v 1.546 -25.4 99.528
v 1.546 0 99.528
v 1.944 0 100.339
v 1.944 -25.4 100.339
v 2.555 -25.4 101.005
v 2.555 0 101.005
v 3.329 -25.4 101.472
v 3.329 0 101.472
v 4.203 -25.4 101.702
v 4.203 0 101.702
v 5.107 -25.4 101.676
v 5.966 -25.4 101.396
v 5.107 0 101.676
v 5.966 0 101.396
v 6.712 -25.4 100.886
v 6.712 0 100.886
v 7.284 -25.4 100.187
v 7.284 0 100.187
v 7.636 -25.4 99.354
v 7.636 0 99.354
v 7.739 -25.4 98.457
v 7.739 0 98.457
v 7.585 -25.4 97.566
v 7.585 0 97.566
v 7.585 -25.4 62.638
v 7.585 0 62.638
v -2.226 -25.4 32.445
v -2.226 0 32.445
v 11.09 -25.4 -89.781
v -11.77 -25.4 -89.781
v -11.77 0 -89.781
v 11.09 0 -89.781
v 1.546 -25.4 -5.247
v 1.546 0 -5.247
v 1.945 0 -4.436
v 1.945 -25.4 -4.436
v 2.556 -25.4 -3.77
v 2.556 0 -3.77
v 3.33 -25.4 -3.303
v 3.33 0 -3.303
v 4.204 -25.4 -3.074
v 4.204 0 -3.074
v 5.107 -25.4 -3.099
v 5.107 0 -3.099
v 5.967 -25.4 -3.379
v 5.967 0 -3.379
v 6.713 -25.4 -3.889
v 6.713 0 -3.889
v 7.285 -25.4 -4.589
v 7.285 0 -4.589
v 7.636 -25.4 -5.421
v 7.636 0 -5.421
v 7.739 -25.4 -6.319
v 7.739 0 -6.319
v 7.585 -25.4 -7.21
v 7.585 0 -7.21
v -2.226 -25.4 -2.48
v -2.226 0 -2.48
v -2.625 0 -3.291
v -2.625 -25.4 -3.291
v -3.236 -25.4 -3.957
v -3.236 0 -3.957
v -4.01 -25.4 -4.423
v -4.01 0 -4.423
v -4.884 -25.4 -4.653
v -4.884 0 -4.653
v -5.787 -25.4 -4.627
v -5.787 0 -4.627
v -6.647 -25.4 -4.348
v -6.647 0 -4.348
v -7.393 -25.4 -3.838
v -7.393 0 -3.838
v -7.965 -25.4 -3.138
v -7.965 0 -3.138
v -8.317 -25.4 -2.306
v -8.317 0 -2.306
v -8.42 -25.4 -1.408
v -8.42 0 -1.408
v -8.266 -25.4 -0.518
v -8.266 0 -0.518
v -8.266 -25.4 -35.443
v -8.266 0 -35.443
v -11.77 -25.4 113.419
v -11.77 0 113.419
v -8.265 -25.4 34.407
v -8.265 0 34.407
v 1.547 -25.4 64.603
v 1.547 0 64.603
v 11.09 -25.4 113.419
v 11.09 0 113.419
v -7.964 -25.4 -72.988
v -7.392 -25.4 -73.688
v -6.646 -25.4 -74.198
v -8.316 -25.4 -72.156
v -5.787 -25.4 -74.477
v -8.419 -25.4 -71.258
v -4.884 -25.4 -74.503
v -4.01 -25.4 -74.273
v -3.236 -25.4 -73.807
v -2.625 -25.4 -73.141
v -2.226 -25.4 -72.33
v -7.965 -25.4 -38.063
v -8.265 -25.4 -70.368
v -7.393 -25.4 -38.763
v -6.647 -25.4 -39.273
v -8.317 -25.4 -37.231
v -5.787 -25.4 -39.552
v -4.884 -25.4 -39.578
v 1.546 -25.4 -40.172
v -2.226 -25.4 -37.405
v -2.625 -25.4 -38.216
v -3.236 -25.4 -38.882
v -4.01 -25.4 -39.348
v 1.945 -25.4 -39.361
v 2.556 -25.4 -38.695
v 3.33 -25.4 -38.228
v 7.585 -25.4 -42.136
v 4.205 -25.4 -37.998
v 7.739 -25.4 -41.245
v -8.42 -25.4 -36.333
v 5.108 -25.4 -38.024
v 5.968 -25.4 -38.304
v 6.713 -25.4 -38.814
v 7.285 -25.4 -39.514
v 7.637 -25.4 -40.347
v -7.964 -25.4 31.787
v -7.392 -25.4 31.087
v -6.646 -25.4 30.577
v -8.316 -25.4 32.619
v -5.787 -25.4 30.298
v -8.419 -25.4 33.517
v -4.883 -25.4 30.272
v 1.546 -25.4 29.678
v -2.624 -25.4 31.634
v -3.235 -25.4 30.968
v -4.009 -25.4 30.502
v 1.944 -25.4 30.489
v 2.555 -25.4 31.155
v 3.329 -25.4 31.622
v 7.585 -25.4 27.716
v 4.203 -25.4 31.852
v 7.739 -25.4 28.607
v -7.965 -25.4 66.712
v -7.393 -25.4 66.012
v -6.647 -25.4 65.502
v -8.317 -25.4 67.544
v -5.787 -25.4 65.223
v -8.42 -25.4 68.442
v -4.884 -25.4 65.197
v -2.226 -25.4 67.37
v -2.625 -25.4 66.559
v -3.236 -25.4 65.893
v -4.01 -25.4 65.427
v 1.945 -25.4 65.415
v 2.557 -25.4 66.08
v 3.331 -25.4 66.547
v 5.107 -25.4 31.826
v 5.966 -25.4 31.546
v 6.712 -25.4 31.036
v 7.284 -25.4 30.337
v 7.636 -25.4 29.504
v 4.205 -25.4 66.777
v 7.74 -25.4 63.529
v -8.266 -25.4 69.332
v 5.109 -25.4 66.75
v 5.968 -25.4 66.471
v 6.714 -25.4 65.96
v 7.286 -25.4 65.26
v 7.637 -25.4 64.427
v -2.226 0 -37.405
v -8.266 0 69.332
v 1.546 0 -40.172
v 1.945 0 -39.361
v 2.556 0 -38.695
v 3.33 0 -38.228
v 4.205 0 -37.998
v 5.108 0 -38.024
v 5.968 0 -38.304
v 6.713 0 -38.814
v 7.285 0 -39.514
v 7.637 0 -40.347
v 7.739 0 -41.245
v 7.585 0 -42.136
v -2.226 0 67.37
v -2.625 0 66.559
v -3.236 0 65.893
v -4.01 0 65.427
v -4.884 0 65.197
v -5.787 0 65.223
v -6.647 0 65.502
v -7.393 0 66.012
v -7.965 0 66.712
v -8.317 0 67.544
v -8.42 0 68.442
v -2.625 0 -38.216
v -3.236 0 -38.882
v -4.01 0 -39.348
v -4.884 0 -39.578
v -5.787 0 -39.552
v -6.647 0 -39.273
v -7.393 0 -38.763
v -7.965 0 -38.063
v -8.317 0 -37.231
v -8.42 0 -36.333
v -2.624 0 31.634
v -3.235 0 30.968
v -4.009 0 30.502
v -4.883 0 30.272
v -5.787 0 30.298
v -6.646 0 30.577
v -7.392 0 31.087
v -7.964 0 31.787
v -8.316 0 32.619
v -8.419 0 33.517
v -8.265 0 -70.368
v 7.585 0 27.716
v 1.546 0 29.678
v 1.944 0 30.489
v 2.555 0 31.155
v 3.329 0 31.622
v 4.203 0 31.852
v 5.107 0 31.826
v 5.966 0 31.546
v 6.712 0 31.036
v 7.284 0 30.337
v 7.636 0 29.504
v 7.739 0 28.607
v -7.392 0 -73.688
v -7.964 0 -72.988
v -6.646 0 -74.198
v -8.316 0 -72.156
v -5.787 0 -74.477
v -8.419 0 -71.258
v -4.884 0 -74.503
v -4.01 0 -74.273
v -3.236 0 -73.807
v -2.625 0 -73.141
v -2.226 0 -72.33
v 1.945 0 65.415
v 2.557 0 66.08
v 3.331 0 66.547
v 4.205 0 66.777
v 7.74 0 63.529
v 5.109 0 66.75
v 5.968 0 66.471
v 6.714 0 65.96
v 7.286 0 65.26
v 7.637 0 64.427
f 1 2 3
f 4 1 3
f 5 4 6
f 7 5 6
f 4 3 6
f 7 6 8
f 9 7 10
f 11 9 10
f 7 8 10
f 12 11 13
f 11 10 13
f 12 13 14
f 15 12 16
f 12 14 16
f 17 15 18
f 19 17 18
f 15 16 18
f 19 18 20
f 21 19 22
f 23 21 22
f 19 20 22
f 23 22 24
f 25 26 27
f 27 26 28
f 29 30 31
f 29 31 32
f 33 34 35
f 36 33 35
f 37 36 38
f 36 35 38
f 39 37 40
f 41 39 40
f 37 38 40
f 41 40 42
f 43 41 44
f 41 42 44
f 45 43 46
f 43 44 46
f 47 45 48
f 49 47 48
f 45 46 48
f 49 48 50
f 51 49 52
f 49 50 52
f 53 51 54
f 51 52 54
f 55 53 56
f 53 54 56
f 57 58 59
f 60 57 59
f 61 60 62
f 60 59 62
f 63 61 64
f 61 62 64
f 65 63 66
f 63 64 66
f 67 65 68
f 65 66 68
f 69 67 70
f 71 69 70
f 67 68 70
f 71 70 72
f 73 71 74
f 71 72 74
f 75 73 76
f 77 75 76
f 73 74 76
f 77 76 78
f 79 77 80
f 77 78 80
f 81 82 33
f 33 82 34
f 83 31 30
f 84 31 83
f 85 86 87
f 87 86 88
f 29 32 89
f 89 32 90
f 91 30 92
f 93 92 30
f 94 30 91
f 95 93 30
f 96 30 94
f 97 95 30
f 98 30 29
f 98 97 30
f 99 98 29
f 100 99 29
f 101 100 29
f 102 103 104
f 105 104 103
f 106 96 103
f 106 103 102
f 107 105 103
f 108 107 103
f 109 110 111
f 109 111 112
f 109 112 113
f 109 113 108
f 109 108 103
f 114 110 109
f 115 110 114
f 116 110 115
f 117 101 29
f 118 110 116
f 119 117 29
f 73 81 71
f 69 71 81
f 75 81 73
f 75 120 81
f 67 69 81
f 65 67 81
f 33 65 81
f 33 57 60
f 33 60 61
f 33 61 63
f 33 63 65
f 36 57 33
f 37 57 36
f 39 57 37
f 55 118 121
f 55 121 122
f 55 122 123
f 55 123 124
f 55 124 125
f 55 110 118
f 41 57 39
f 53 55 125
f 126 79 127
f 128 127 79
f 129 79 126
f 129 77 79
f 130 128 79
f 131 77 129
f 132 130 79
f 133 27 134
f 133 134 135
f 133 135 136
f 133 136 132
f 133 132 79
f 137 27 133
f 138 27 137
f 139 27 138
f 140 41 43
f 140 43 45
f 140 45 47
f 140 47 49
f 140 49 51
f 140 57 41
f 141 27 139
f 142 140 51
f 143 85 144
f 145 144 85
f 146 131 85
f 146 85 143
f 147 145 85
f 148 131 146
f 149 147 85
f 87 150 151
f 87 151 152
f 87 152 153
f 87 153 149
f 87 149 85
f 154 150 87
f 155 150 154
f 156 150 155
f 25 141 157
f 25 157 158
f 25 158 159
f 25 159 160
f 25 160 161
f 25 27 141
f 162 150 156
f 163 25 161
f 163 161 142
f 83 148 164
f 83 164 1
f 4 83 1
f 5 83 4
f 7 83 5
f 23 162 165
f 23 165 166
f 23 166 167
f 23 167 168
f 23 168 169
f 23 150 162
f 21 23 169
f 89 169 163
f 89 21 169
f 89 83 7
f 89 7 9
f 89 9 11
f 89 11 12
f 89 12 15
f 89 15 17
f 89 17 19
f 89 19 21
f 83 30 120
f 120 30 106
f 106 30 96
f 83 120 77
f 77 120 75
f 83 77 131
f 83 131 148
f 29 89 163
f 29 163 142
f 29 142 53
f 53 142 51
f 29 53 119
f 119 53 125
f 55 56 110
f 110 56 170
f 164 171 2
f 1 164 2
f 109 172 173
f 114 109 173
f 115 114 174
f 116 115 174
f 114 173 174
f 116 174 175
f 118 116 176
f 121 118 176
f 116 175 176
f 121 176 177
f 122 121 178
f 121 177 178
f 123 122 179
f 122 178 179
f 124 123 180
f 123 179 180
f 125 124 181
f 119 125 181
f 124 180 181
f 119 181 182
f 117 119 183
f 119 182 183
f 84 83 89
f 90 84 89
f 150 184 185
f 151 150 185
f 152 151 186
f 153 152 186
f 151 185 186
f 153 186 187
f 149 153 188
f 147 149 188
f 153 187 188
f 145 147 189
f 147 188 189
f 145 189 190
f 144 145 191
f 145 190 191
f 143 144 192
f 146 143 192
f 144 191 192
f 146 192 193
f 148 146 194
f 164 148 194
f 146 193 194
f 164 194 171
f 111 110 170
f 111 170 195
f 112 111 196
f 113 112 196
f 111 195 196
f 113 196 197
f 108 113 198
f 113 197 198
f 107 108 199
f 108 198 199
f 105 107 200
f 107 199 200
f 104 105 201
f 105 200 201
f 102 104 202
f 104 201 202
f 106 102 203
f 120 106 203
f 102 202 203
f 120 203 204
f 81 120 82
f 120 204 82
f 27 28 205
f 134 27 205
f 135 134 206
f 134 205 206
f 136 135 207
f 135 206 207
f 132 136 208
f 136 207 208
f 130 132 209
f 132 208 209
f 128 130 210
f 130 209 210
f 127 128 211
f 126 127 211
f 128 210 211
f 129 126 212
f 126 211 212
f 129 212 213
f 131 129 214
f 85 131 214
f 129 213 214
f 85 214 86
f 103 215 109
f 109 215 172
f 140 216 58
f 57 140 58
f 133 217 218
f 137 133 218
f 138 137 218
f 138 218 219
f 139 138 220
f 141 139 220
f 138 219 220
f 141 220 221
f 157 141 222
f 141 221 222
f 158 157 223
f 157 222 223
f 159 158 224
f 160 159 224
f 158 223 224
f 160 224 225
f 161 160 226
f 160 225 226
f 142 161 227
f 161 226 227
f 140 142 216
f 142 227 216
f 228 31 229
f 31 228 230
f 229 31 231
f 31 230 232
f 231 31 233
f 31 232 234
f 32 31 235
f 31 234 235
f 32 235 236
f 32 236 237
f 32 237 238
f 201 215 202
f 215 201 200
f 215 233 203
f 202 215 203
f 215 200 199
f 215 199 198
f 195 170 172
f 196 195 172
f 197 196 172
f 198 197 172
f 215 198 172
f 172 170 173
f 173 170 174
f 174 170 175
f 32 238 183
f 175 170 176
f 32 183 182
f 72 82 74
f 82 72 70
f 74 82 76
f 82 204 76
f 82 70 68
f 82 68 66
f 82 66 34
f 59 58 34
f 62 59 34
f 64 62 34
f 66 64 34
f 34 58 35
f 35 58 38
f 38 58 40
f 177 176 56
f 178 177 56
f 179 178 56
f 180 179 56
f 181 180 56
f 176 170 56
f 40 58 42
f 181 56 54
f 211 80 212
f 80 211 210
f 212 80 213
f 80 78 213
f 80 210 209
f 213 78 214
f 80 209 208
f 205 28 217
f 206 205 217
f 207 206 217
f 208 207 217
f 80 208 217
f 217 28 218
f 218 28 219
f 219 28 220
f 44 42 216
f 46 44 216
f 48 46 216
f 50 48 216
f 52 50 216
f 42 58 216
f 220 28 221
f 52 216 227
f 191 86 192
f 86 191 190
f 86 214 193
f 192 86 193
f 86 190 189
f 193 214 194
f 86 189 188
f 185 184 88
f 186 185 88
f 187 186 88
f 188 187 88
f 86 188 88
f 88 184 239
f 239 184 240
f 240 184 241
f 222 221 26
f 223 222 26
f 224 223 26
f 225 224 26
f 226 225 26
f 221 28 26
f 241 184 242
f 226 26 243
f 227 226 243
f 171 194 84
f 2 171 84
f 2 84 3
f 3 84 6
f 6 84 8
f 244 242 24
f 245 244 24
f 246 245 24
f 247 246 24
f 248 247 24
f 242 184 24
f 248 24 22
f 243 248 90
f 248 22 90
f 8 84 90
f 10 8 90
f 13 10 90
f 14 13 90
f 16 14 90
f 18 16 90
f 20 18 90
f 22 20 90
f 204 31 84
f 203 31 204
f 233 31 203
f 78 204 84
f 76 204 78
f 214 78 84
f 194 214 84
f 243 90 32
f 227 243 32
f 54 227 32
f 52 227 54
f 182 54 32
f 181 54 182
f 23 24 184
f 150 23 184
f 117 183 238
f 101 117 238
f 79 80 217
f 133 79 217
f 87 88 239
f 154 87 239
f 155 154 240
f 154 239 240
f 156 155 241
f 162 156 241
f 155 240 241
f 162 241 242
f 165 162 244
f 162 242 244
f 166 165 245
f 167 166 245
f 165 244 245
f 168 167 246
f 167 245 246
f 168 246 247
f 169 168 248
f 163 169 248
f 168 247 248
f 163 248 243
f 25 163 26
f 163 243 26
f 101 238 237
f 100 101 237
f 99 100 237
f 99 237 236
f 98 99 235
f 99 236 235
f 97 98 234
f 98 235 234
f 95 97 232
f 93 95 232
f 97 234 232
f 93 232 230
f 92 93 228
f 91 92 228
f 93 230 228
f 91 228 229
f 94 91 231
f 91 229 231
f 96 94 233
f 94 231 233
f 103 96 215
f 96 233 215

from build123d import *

# Parameters (mm, degrees)
F0_W     = 22.86
F0_H     = 203.2
F1_DEPTH = 25.4


# Not quite as in the source:
# - ends of sketch curves that miss each other by under 0.0002 mm in the source are joined


with BuildPart() as f1:
    # F0 (on Front) → F1 (new body)
    with BuildSketch(Plane.XZ):
        with Locations((-0.3399215189, 11.8189063548)):
            Rectangle(F0_W, F0_H)
        with BuildLine():
            Line((7.5848784811, -7.2097627448), (-2.2264276225, -37.4049924117))
            ThreePointArc((-2.2264276225, -37.4049924117), (-6.2271781929, -39.4434341876), (-8.2656199687, -35.4426836172))
            Line((-8.2656199687, -35.4426836172), (1.5459240038, -5.2467218859))
            ThreePointArc((1.5459240926, -5.2467219148), (5.5470406879, -3.2083990956), (7.5848784811, -7.2097627448))
        make_face(mode=Mode.SUBTRACT)
        with BuildLine():
            Line((7.5848784811, -42.1355889051), (-2.2258696668, -72.3299669673))
            ThreePointArc((-2.2258696668, -72.3299669673), (-6.2266030631, -74.3684424494), (-8.2650785452, -70.367709053))
            Line((-8.2650785452, -70.367709053), (1.5462110262, -40.1716646606))
            ThreePointArc((1.5462110262, -40.1716646606), (5.5477780101, -38.1334601546), (7.5848784811, -42.1355889051))
        make_face(mode=Mode.SUBTRACT)
        with BuildLine():
            Line((7.5848784811, 27.7160793915), (-2.2264110515, -2.4799669119))
            ThreePointArc((-2.2264110515, -2.4799669119), (-6.2271444076, -4.5184424731), (-8.2656199687, -0.517709117))
            Line((-8.2656199687, -0.517709117), (1.5456690059, 29.6783354693))
            ThreePointArc((1.5456690059, 29.6783354693), (5.5464015034, 31.7168113094), (7.5848784811, 27.7160793915))
        make_face(mode=Mode.SUBTRACT)
        with BuildLine():
            Line((7.5848784811, 97.5660773977), (-2.2264110903, 67.3700330053))
            ThreePointArc((-2.2264110903, 67.3700330053), (-6.2271444866, 65.3315575232), (-8.2656199687, 69.3322909196))
            Line((-8.2656199687, 69.3322909196), (1.5456696027, 99.528335312))
            ThreePointArc((1.5456696027, 99.528335312), (5.546402999, 101.5668107941), (7.5848784811, 97.5660773977))
        make_face(mode=Mode.SUBTRACT)
        with BuildLine():
            Line((7.5848784811, 62.6383122648), (-2.2255126404, 32.4450330169))
            ThreePointArc((-2.2255126404, 32.4450330169), (-6.2262460368, 30.4065575348), (-8.2647215189, 34.4072909311))
            Line((-8.2647215189, 34.4072909311), (1.5465680525, 64.6033353235))
            ThreePointArc((1.5465680525, 64.6033353235), (5.5486851845, 66.6413608527), (7.5848784811, 62.6383122648))
        make_face(mode=Mode.SUBTRACT)
    extrude(amount=F1_DEPTH)


solid = f1.part
